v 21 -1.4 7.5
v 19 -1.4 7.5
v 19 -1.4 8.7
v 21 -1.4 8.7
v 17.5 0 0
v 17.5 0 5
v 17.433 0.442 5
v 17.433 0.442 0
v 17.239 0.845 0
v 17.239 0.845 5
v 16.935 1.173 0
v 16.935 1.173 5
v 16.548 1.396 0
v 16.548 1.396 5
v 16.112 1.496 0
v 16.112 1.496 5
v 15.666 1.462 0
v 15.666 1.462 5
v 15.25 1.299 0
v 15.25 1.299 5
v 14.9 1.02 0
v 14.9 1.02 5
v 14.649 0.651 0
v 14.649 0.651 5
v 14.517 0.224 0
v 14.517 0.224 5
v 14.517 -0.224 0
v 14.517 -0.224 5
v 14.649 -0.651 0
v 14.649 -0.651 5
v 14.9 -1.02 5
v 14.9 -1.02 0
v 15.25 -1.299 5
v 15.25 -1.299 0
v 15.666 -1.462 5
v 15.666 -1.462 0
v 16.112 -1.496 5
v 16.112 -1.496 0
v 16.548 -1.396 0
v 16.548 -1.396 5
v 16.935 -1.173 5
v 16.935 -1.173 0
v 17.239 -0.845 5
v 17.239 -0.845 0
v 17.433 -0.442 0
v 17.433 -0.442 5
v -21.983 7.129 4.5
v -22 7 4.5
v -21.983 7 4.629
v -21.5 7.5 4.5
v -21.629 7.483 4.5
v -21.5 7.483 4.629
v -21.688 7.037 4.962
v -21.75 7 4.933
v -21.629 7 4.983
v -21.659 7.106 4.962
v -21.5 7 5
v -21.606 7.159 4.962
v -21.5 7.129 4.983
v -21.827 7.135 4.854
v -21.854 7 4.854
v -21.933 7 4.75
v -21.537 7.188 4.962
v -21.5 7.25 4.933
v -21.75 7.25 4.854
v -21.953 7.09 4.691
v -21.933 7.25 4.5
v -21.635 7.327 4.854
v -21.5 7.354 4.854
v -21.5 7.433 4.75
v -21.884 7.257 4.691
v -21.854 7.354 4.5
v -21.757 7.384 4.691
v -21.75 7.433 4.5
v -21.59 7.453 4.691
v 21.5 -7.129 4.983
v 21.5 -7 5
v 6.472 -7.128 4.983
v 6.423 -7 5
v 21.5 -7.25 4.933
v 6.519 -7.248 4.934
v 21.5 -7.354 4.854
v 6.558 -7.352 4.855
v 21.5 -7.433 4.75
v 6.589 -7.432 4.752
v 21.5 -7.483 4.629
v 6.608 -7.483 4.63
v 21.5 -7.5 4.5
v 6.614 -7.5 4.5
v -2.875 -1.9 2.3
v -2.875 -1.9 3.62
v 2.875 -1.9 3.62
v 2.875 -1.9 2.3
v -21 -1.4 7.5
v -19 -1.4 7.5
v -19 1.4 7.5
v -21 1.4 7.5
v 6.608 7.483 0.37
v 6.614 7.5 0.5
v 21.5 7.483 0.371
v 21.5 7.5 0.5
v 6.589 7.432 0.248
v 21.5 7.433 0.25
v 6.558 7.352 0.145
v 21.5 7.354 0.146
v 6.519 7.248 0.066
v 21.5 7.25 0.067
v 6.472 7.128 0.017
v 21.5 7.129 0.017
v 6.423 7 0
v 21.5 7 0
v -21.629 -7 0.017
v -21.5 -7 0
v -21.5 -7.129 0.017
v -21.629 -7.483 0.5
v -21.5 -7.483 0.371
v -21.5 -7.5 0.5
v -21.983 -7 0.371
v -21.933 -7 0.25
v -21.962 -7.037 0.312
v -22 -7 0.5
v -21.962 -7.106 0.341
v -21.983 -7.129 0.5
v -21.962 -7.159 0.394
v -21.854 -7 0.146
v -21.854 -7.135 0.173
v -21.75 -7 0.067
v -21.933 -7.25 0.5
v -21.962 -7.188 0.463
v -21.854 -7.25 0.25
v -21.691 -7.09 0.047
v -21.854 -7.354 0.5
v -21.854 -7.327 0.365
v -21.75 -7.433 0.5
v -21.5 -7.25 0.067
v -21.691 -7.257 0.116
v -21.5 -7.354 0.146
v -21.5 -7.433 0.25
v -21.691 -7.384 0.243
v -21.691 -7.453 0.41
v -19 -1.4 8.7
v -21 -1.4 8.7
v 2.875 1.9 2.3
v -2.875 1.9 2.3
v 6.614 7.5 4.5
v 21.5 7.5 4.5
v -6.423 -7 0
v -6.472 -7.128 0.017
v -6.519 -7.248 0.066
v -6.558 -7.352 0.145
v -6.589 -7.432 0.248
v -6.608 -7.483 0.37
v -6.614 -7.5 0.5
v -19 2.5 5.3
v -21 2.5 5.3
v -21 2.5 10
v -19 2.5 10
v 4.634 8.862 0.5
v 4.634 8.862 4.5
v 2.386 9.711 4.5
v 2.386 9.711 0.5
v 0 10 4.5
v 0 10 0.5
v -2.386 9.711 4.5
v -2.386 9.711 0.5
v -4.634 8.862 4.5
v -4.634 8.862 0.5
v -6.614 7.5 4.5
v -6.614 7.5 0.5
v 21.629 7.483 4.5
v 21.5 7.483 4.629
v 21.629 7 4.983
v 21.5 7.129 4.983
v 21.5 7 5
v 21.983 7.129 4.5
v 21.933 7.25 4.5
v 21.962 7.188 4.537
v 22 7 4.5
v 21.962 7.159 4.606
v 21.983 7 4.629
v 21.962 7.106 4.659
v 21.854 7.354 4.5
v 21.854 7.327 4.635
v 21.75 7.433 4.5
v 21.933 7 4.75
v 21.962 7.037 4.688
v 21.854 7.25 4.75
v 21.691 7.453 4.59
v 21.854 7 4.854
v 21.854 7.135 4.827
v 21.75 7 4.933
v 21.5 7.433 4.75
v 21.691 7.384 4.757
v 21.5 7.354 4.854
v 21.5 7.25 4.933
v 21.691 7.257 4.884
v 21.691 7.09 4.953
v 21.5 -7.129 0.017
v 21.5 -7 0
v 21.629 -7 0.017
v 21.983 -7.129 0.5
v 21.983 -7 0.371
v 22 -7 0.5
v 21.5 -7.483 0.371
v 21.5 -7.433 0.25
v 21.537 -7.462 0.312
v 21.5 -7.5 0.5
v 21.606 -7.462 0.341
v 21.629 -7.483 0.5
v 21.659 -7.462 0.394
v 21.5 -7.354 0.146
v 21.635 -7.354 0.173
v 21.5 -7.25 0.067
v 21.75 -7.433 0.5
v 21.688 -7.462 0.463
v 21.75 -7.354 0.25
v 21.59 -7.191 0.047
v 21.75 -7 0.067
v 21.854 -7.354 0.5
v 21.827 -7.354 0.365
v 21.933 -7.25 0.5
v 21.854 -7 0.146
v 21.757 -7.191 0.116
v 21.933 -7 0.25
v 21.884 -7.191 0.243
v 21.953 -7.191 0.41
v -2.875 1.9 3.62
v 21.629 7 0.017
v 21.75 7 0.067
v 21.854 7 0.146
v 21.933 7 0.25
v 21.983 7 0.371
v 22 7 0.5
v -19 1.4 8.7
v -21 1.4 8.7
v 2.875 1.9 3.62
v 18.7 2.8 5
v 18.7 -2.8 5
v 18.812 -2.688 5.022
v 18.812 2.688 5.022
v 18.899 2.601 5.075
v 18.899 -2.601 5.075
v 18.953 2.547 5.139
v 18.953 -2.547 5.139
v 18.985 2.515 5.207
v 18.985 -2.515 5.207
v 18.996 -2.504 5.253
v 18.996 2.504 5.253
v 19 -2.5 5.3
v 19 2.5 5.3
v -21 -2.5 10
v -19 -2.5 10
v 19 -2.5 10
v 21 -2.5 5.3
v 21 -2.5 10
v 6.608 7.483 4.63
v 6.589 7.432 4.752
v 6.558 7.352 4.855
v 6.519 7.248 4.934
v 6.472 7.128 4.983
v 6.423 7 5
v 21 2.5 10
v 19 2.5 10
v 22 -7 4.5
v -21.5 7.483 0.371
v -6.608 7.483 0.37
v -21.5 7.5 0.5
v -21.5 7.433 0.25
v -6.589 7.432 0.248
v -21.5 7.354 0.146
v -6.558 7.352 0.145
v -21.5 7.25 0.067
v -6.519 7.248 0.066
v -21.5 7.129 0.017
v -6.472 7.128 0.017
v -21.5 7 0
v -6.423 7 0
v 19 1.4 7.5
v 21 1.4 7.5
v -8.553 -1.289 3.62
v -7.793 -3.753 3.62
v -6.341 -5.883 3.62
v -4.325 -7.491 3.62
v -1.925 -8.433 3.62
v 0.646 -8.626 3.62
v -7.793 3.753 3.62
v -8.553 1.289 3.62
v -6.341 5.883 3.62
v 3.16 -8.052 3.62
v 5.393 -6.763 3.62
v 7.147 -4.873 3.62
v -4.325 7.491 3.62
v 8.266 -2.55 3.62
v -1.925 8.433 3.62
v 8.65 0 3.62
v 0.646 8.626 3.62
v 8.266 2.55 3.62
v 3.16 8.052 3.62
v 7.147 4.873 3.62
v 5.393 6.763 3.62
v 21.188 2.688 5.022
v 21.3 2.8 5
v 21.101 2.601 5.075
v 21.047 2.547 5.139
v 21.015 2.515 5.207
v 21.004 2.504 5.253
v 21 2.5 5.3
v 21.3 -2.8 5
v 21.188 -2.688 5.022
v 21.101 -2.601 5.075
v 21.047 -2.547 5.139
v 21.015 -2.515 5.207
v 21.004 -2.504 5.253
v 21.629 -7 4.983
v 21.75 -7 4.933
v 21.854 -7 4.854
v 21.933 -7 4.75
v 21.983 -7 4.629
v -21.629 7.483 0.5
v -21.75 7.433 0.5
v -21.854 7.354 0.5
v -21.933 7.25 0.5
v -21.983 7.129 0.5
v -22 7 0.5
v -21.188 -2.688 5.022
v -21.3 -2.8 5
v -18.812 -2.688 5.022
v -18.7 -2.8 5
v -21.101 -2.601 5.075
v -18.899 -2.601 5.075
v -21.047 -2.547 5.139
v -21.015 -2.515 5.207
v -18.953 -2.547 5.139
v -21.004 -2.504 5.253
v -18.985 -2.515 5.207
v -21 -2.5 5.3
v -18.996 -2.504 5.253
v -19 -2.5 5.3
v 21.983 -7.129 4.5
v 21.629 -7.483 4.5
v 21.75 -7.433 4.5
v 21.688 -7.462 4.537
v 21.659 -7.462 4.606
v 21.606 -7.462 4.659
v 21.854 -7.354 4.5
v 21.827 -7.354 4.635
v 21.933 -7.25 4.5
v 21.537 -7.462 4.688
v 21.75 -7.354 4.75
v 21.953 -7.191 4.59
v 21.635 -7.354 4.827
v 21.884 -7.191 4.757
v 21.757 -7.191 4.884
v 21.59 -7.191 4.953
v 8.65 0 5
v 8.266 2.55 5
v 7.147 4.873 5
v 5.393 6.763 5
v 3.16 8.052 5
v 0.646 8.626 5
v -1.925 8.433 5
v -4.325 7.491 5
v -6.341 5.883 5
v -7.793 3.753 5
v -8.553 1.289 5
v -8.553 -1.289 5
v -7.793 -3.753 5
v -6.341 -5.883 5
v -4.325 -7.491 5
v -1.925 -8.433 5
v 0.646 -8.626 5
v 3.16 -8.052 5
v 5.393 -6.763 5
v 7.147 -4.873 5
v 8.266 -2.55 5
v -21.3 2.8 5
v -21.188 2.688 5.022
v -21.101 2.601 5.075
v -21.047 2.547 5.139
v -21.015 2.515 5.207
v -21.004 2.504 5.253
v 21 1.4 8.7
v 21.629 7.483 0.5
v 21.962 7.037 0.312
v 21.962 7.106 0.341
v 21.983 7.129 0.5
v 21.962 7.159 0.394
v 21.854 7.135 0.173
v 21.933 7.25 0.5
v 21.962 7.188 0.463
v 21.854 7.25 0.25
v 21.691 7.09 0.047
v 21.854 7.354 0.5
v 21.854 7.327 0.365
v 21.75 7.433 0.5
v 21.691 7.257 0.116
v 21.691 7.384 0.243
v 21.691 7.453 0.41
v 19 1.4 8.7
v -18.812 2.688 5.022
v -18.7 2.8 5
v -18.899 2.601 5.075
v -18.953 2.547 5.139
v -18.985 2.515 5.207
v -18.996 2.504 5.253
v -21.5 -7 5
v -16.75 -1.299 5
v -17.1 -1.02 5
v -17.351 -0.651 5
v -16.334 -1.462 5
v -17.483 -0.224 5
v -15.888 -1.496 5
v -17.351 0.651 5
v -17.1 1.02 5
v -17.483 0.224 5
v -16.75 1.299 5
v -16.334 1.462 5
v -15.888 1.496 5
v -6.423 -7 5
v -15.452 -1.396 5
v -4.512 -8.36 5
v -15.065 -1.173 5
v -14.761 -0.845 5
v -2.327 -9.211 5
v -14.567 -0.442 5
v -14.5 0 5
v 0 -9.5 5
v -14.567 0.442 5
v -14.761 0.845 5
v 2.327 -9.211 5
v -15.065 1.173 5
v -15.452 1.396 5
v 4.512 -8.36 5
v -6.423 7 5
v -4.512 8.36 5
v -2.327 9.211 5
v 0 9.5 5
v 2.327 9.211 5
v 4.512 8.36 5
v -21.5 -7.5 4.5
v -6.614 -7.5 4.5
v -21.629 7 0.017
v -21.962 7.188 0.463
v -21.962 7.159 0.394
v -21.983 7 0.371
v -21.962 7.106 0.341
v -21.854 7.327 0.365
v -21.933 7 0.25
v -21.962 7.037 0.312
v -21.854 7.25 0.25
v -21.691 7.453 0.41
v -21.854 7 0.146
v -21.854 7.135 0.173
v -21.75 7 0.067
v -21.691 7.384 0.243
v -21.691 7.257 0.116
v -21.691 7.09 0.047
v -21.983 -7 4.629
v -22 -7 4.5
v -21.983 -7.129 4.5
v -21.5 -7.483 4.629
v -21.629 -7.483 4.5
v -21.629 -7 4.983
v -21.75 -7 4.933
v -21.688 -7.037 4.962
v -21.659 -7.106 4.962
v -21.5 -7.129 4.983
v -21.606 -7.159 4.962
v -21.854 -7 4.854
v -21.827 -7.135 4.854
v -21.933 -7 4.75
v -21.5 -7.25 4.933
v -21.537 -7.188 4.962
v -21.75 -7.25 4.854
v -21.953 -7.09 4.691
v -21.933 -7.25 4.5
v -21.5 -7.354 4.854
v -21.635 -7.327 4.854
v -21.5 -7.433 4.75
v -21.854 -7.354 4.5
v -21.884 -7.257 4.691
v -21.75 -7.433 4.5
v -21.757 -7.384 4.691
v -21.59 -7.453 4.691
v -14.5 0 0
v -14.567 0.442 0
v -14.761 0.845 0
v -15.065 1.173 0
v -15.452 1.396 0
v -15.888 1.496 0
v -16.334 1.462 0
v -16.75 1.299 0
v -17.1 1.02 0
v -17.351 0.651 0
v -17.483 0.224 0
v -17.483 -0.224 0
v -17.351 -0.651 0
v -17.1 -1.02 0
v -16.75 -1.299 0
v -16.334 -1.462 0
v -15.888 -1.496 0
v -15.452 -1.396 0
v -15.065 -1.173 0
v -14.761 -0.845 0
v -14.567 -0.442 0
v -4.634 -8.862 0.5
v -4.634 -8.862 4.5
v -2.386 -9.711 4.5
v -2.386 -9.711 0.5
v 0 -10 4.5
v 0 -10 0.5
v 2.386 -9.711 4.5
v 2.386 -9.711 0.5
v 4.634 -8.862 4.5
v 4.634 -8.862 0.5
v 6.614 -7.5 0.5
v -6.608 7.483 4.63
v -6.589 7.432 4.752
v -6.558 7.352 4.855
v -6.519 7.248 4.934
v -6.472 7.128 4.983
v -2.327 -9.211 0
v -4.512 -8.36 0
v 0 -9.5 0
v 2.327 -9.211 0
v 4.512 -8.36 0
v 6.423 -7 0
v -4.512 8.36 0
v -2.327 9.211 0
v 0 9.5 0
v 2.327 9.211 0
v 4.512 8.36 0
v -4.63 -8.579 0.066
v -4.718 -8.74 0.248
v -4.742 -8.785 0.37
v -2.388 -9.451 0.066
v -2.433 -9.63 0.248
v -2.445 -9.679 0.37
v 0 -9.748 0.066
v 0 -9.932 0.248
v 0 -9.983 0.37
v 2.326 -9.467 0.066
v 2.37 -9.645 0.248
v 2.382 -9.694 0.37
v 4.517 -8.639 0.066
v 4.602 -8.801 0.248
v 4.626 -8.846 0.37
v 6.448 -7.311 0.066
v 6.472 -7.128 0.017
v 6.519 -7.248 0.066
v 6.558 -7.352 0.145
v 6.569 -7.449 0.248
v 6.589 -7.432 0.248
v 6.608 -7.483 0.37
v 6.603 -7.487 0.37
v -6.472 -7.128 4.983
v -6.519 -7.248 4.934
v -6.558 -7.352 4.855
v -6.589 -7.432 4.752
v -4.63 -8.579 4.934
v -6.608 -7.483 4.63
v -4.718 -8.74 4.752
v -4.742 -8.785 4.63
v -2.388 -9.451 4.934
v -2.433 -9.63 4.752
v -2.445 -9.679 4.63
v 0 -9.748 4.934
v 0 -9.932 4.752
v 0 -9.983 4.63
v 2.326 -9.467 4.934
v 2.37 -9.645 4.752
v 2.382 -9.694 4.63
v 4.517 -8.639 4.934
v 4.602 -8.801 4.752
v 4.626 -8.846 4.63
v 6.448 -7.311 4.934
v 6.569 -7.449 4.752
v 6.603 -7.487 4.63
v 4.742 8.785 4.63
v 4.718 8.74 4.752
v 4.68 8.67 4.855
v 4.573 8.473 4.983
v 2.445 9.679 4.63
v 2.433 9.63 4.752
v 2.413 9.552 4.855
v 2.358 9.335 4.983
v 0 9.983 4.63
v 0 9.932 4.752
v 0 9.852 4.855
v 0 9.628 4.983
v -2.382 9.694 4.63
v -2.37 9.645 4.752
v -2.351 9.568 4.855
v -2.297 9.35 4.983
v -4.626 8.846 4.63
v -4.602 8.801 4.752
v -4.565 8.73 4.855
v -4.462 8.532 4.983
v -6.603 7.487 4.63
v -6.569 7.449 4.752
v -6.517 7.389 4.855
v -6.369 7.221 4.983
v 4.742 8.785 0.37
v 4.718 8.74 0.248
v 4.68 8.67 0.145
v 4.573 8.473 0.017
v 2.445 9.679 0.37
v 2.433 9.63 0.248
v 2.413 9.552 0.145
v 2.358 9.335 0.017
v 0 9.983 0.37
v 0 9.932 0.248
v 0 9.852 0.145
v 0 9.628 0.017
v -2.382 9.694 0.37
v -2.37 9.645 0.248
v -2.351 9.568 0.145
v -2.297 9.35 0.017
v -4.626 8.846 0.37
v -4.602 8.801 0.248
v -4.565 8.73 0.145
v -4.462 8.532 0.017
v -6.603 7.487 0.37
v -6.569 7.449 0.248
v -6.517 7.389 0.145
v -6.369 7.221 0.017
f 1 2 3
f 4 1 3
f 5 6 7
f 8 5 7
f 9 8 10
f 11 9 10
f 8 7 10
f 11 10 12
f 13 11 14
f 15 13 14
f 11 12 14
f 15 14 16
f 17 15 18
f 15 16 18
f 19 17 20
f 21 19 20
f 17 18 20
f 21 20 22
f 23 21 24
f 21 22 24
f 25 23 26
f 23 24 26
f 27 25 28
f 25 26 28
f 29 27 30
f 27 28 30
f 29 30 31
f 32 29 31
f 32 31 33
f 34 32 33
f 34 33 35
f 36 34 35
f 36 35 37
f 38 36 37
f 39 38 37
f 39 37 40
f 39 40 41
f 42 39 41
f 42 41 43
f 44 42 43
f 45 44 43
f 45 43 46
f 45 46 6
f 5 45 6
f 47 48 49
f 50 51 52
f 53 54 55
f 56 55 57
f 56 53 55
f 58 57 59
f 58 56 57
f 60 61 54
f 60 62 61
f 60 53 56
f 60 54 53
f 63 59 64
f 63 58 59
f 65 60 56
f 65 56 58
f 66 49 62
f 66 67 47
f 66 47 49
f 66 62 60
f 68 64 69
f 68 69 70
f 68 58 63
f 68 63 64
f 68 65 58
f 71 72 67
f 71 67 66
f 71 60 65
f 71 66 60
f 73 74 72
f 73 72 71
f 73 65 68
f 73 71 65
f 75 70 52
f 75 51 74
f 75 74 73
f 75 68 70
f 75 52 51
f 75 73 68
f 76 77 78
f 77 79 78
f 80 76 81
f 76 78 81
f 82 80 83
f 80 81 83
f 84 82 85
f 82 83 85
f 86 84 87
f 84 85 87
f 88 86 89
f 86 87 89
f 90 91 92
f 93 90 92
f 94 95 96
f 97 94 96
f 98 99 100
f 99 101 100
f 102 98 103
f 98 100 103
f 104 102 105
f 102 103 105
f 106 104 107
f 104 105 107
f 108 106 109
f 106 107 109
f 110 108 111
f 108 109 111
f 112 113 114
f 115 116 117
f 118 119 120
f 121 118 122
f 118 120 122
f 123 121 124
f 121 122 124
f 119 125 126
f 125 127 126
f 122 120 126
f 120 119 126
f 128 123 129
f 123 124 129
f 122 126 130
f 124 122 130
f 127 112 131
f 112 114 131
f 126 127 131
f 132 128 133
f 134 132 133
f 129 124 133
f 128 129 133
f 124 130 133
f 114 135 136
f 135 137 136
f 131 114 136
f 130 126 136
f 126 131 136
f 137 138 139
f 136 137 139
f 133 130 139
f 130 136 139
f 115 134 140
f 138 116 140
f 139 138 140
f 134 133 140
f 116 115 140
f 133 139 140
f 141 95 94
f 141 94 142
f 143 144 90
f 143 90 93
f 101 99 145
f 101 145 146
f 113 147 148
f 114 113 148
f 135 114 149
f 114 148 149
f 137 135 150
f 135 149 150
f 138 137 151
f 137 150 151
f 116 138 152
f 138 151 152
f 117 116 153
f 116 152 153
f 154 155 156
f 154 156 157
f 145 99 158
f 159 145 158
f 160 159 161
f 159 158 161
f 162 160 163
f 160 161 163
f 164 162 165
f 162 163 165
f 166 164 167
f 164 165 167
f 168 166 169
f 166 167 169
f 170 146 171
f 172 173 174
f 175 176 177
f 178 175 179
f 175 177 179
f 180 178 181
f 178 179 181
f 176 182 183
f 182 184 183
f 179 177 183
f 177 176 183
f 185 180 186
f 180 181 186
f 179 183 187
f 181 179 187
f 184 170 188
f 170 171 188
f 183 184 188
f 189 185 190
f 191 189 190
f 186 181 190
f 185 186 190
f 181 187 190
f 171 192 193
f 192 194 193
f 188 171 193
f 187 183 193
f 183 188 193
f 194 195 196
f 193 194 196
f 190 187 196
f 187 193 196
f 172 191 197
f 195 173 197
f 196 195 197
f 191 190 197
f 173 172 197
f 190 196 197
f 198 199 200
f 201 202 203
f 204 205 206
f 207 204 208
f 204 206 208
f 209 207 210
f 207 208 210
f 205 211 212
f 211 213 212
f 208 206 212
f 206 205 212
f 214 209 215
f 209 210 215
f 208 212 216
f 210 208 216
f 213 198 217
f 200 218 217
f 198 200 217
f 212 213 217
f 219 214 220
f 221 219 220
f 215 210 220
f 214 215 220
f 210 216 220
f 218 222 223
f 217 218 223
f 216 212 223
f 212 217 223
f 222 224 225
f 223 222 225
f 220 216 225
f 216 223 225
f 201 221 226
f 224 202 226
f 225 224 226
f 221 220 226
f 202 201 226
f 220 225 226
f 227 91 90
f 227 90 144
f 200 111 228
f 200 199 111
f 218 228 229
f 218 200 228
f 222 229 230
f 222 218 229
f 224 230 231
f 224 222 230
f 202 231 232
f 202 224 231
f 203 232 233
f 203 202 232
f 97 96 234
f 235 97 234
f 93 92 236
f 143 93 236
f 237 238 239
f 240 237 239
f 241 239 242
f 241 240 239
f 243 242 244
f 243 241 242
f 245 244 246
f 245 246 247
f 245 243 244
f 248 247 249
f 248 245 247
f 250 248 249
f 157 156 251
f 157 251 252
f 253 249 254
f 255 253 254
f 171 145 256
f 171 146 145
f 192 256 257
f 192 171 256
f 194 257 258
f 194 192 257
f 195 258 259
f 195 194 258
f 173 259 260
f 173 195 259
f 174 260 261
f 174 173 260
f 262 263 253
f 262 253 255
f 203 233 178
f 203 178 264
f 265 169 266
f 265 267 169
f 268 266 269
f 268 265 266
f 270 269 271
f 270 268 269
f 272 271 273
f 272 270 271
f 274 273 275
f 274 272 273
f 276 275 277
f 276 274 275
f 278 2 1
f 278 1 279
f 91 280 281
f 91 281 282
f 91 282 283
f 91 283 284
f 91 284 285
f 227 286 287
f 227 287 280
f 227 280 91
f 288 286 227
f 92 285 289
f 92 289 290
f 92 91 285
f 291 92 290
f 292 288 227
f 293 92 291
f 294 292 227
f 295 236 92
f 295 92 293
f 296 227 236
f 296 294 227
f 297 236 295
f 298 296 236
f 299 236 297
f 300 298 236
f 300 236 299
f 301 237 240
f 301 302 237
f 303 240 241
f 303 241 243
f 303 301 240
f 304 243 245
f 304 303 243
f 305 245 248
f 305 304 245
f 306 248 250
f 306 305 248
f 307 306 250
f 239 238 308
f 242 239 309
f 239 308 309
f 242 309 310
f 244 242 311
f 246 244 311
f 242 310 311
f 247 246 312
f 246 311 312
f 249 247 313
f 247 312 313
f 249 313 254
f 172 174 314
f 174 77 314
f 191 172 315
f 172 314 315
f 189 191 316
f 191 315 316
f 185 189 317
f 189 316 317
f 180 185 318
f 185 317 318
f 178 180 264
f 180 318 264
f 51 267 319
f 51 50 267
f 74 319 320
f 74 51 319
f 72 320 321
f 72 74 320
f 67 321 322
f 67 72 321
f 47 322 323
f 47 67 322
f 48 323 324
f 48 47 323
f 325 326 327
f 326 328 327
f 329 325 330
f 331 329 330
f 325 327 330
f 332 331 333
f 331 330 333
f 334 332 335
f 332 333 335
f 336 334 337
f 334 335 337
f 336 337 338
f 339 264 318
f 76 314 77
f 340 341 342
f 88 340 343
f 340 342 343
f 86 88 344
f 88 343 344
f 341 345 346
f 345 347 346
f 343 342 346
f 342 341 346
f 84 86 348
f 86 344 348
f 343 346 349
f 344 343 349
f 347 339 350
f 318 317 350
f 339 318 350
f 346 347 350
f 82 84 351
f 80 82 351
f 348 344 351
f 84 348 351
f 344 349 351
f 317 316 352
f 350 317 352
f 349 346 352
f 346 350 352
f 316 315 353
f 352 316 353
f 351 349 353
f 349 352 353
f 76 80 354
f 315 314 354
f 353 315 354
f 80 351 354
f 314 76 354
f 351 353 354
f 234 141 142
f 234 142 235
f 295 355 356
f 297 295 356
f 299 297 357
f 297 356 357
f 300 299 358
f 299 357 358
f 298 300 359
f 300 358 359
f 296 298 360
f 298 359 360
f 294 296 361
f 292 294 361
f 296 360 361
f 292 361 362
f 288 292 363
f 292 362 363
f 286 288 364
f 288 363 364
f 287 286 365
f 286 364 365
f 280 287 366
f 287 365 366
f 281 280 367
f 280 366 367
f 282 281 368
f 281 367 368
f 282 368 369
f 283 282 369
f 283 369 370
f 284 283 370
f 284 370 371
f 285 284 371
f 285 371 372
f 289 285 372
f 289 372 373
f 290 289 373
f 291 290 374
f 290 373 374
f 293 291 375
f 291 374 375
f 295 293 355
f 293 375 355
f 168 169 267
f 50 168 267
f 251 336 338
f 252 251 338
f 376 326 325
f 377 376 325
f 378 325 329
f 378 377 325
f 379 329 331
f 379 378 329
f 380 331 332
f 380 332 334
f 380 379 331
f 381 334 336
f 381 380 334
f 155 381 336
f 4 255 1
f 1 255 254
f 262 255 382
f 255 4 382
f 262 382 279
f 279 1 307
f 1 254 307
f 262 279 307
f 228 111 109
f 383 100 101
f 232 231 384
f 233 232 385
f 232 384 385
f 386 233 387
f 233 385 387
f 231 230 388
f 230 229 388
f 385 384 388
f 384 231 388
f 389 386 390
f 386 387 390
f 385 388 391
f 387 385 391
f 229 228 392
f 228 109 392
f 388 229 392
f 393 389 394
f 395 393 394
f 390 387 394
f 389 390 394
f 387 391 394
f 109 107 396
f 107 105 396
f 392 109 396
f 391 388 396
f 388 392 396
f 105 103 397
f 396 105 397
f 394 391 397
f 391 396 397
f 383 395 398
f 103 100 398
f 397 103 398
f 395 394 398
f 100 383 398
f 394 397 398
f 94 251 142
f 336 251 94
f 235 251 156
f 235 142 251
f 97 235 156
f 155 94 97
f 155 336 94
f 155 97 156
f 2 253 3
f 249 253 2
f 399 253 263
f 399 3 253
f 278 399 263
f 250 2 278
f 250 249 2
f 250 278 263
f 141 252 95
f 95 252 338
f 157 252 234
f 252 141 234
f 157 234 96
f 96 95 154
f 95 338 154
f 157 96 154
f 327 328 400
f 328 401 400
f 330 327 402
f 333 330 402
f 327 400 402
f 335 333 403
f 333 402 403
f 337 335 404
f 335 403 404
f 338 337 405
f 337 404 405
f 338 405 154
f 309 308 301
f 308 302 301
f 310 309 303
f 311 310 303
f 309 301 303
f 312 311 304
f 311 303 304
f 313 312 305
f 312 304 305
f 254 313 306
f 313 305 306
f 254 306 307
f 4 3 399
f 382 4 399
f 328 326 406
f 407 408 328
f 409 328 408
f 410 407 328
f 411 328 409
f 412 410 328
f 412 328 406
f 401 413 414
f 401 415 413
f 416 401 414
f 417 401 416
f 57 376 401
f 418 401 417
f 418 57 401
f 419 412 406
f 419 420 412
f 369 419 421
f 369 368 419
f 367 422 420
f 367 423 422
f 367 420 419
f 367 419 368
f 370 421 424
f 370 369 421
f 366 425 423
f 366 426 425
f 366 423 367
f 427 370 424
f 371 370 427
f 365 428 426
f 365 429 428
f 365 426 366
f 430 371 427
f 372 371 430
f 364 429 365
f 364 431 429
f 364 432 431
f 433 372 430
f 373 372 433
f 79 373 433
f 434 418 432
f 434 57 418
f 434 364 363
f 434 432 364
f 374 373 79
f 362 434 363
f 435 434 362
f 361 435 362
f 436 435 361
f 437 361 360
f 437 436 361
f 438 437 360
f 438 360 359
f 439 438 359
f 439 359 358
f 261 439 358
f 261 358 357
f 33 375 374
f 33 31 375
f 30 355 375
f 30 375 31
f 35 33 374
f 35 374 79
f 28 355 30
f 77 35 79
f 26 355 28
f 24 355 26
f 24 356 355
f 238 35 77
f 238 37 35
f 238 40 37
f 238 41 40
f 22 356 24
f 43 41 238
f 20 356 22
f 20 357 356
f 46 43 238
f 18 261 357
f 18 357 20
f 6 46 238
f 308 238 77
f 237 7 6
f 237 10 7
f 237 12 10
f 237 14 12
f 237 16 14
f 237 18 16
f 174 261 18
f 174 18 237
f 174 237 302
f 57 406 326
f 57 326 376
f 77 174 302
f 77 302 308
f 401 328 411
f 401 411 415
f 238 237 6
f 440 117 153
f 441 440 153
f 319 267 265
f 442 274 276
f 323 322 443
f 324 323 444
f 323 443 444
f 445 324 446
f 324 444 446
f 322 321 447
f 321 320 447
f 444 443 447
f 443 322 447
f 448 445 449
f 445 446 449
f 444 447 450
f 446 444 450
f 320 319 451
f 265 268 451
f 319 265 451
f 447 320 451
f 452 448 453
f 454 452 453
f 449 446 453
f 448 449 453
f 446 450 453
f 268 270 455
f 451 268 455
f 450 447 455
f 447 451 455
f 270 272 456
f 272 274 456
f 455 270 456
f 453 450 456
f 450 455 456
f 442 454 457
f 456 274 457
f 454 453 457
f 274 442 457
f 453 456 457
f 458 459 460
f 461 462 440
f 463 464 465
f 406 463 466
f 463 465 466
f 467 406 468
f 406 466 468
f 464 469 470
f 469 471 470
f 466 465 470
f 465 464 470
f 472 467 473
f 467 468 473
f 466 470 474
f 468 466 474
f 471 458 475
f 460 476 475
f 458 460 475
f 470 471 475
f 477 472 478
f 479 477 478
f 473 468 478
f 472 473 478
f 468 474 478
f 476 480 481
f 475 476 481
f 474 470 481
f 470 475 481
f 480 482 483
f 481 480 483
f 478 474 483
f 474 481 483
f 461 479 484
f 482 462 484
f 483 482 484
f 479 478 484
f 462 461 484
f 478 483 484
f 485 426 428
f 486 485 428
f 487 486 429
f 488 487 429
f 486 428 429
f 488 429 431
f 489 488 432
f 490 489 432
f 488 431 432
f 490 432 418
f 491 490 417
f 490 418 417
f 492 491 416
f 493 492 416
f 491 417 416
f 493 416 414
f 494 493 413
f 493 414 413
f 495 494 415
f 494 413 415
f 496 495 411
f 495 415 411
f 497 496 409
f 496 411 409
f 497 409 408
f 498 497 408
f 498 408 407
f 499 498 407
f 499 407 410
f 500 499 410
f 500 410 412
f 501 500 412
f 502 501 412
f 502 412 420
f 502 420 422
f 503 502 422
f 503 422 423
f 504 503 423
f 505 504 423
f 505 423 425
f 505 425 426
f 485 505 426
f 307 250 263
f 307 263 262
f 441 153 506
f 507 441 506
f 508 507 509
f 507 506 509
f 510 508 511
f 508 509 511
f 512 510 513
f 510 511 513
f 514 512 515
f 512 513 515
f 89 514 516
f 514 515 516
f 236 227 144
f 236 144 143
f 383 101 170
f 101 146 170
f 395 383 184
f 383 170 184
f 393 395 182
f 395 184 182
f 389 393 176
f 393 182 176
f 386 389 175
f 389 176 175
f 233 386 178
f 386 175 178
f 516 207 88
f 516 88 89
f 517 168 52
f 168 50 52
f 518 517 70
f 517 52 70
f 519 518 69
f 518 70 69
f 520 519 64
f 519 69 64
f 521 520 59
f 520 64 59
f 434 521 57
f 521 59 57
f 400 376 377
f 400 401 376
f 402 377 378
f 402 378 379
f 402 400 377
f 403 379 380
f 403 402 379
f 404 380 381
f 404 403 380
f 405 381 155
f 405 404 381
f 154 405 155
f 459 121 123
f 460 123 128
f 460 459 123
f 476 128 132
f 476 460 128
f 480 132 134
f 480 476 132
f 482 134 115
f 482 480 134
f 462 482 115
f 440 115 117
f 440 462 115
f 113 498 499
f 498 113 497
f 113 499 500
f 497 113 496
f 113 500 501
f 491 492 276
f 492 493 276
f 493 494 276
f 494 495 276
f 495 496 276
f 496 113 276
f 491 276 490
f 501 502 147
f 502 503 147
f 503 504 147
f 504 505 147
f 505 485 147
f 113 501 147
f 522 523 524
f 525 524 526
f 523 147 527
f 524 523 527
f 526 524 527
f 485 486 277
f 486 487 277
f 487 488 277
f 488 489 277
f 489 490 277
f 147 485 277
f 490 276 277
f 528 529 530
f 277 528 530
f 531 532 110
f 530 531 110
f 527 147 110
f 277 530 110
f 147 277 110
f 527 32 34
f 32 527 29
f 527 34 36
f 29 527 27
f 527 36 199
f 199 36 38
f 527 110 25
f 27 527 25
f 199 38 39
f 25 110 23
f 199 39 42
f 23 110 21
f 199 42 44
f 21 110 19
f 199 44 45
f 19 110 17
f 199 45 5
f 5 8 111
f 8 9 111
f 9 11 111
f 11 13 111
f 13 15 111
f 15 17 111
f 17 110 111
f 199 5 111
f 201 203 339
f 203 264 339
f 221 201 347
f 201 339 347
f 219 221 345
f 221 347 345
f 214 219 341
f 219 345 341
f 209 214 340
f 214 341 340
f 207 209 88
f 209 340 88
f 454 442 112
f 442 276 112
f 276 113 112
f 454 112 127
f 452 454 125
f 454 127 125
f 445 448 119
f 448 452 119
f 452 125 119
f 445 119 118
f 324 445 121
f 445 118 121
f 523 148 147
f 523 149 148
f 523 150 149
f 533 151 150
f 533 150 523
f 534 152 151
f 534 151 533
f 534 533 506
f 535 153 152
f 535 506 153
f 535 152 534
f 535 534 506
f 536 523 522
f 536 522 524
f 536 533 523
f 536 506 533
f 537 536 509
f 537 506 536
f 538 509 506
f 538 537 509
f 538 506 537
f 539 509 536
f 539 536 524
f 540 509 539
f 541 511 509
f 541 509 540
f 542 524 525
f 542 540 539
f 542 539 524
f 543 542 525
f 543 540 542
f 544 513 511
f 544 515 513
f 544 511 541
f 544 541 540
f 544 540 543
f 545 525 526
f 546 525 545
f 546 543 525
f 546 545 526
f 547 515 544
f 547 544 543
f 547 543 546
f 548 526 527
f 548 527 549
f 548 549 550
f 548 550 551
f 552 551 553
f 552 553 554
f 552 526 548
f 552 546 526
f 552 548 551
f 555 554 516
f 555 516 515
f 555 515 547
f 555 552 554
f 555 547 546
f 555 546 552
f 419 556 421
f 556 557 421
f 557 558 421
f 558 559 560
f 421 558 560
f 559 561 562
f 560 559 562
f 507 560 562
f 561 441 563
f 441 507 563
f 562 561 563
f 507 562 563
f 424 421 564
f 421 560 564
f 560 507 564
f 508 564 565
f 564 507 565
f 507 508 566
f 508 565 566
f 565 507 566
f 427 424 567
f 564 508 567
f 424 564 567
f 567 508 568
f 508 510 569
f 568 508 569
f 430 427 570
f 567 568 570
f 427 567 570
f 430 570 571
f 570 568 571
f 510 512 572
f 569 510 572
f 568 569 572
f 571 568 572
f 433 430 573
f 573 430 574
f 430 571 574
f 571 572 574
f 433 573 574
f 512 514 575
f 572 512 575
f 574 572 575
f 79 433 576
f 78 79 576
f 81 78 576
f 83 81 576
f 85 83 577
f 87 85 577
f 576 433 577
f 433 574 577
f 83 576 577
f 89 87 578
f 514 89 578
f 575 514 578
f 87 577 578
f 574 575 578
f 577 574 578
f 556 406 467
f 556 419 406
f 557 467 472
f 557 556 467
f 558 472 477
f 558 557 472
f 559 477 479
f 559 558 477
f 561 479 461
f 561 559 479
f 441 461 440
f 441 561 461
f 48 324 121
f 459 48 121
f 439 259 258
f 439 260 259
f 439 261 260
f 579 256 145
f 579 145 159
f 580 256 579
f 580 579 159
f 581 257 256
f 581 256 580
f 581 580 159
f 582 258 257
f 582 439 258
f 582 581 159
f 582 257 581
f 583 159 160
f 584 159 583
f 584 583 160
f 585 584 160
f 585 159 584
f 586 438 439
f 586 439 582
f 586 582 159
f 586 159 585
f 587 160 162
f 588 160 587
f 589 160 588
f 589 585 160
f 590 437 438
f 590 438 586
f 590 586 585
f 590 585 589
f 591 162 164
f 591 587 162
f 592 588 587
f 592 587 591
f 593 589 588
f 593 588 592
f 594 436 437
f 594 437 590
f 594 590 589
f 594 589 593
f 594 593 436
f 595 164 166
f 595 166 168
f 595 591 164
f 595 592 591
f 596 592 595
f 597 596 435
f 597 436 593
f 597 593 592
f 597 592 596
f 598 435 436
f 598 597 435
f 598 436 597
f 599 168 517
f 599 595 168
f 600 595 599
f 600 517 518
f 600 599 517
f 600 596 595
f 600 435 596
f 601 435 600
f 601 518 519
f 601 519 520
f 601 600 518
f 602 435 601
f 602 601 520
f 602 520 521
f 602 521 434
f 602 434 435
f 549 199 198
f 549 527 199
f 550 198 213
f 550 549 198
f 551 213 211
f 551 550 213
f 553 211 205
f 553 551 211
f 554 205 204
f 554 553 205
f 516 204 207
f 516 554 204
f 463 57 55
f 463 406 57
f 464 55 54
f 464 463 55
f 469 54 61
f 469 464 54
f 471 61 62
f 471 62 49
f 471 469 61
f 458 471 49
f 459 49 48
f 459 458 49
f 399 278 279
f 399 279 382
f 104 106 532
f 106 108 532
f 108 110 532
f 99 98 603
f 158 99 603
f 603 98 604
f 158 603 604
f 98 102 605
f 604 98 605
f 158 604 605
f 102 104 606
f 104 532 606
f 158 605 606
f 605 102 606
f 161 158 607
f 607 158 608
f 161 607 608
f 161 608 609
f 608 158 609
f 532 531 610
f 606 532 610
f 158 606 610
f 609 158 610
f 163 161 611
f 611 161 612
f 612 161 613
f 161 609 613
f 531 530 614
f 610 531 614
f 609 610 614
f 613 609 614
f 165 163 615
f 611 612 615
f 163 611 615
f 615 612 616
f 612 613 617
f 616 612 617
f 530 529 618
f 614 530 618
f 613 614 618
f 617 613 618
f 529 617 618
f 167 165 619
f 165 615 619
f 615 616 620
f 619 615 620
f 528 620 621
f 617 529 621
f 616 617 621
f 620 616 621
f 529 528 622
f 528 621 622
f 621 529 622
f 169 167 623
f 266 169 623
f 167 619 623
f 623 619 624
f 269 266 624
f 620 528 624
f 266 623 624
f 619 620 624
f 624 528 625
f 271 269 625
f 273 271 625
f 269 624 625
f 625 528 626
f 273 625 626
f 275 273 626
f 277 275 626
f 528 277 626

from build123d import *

# Parameters (mm, degrees)
PAD_DEPTH            = 5
SKETCH001_R          = 8.65
POCKET_DEPTH         = 1.38
SKETCH002_W          = 5.75
SKETCH002_H          = 3.8
POCKET001_DEPTH      = 1.32
SKETCH003_R          = 1.5
POCKET002_DEPTH      = 5.001
FILLET_R             = 0.5
SKETCH004_W          = 2
SKETCH004_H          = 5
PAD001_DEPTH         = 5
FILLET001_R          = 0.3
SKETCH005_W          = 2.8
SKETCH005_H          = 1.2
POCKET003_DEPTH      = 3.001
POCKET003_DEPTH_BACK = -41.001


with BuildPart() as part:
    # Sketch → Pad (new body)
    with BuildSketch(Plane.XY):
        with BuildLine():
            ThreePointArc((6.614378, 7.5), (0, 10), (-6.614378, 7.5))
            Line((-6.614378, 7.5), (-22, 7.5))
            Line((-22, 7.5), (-22, -7.5))
            Line((-22, -7.5), (-6.614378, -7.5))
            ThreePointArc((-6.614378, -7.5), (0, -10), (6.614378, -7.5))
            Line((22, -7.5), (6.614378, -7.5))
            Line((22, 7.5), (22, -7.5))
            Line((6.614378, 7.5), (22, 7.5))
        make_face()
    extrude(amount=PAD_DEPTH)

    # Sketch001 → Pocket (cut)
    with BuildSketch(Plane.XY.offset(5)):
        Circle(SKETCH001_R)
    extrude(amount=-POCKET_DEPTH, mode=Mode.SUBTRACT)

    # Sketch002 → Pocket001 (cut)
    with BuildSketch(Plane.XY.offset(3.62)):
        Rectangle(SKETCH002_W, SKETCH002_H)
    extrude(amount=-POCKET001_DEPTH, mode=Mode.SUBTRACT)

    # Sketch003 → Pocket002 (cut, through all)
    with BuildSketch(Plane.XY.offset(5)):
        with Locations((-16, 0)):
            Circle(SKETCH003_R)
        with Locations((16, 0)):
            Circle(SKETCH003_R)
    extrude(amount=-POCKET002_DEPTH, mode=Mode.SUBTRACT)

    # Fillet
    fillet_edges = [part.edges().sort_by_distance(p)[0] for p in [
        (-14.307189, 7.5, 0),
        (0, 10, 0),
        (14.307189, 7.5, 0),
        (22, 0, 0),
        (14.307189, -7.5, 0),
        (0, -10, 0),
        (-14.307189, -7.5, 0),
        (-22, 7.5, 2.5),
        (-22, 0, 0),
        (-22, -7.5, 2.5),
        (-22, 0, 5),
        (-14.307189, 7.5, 5),
        (0, 10, 5),
        (14.307189, 7.5, 5),
        (22, 7.5, 2.5),
        (22, 0, 5),
        (22, -7.5, 2.5),
        (14.307189, -7.5, 5),
        (0, -10, 5),
        (-14.307189, -7.5, 5),
    ]]
    fillet(fillet_edges, radius=FILLET_R)

    # Sketch004 → Pad001 (new body)
    with BuildSketch(Plane.XY.offset(5)):
        with Locations((-20, 0)):
            Rectangle(SKETCH004_W, SKETCH004_H)
        with Locations((20, 0)):
            Rectangle(SKETCH004_W, SKETCH004_H)
    extrude(amount=PAD001_DEPTH)

    # Fillet001
    fillet001_edges = [part.edges().sort_by_distance(p)[0] for p in [
        (-21, 0, 5),
        (-20, -2.5, 5),
        (20, -2.5, 5),
        (19, 0, 5),
        (-20, 2.5, 5),
        (-19, 0, 5),
        (20, 2.5, 5),
        (21, 0, 5),
    ]]
    fillet(fillet001_edges, radius=FILLET001_R)

    # Sketch005 → Pocket003 (cut, two sides)
    with BuildSketch(Plane.YZ.offset(-19)) as pocket003_sk:
        with Locations((0, 8.1)):
            Rectangle(SKETCH005_W, SKETCH005_H)
    extrude(amount=-POCKET003_DEPTH, mode=Mode.SUBTRACT)
    extrude(pocket003_sk.sketch, amount=-POCKET003_DEPTH_BACK, mode=Mode.SUBTRACT)


solid = part.part
